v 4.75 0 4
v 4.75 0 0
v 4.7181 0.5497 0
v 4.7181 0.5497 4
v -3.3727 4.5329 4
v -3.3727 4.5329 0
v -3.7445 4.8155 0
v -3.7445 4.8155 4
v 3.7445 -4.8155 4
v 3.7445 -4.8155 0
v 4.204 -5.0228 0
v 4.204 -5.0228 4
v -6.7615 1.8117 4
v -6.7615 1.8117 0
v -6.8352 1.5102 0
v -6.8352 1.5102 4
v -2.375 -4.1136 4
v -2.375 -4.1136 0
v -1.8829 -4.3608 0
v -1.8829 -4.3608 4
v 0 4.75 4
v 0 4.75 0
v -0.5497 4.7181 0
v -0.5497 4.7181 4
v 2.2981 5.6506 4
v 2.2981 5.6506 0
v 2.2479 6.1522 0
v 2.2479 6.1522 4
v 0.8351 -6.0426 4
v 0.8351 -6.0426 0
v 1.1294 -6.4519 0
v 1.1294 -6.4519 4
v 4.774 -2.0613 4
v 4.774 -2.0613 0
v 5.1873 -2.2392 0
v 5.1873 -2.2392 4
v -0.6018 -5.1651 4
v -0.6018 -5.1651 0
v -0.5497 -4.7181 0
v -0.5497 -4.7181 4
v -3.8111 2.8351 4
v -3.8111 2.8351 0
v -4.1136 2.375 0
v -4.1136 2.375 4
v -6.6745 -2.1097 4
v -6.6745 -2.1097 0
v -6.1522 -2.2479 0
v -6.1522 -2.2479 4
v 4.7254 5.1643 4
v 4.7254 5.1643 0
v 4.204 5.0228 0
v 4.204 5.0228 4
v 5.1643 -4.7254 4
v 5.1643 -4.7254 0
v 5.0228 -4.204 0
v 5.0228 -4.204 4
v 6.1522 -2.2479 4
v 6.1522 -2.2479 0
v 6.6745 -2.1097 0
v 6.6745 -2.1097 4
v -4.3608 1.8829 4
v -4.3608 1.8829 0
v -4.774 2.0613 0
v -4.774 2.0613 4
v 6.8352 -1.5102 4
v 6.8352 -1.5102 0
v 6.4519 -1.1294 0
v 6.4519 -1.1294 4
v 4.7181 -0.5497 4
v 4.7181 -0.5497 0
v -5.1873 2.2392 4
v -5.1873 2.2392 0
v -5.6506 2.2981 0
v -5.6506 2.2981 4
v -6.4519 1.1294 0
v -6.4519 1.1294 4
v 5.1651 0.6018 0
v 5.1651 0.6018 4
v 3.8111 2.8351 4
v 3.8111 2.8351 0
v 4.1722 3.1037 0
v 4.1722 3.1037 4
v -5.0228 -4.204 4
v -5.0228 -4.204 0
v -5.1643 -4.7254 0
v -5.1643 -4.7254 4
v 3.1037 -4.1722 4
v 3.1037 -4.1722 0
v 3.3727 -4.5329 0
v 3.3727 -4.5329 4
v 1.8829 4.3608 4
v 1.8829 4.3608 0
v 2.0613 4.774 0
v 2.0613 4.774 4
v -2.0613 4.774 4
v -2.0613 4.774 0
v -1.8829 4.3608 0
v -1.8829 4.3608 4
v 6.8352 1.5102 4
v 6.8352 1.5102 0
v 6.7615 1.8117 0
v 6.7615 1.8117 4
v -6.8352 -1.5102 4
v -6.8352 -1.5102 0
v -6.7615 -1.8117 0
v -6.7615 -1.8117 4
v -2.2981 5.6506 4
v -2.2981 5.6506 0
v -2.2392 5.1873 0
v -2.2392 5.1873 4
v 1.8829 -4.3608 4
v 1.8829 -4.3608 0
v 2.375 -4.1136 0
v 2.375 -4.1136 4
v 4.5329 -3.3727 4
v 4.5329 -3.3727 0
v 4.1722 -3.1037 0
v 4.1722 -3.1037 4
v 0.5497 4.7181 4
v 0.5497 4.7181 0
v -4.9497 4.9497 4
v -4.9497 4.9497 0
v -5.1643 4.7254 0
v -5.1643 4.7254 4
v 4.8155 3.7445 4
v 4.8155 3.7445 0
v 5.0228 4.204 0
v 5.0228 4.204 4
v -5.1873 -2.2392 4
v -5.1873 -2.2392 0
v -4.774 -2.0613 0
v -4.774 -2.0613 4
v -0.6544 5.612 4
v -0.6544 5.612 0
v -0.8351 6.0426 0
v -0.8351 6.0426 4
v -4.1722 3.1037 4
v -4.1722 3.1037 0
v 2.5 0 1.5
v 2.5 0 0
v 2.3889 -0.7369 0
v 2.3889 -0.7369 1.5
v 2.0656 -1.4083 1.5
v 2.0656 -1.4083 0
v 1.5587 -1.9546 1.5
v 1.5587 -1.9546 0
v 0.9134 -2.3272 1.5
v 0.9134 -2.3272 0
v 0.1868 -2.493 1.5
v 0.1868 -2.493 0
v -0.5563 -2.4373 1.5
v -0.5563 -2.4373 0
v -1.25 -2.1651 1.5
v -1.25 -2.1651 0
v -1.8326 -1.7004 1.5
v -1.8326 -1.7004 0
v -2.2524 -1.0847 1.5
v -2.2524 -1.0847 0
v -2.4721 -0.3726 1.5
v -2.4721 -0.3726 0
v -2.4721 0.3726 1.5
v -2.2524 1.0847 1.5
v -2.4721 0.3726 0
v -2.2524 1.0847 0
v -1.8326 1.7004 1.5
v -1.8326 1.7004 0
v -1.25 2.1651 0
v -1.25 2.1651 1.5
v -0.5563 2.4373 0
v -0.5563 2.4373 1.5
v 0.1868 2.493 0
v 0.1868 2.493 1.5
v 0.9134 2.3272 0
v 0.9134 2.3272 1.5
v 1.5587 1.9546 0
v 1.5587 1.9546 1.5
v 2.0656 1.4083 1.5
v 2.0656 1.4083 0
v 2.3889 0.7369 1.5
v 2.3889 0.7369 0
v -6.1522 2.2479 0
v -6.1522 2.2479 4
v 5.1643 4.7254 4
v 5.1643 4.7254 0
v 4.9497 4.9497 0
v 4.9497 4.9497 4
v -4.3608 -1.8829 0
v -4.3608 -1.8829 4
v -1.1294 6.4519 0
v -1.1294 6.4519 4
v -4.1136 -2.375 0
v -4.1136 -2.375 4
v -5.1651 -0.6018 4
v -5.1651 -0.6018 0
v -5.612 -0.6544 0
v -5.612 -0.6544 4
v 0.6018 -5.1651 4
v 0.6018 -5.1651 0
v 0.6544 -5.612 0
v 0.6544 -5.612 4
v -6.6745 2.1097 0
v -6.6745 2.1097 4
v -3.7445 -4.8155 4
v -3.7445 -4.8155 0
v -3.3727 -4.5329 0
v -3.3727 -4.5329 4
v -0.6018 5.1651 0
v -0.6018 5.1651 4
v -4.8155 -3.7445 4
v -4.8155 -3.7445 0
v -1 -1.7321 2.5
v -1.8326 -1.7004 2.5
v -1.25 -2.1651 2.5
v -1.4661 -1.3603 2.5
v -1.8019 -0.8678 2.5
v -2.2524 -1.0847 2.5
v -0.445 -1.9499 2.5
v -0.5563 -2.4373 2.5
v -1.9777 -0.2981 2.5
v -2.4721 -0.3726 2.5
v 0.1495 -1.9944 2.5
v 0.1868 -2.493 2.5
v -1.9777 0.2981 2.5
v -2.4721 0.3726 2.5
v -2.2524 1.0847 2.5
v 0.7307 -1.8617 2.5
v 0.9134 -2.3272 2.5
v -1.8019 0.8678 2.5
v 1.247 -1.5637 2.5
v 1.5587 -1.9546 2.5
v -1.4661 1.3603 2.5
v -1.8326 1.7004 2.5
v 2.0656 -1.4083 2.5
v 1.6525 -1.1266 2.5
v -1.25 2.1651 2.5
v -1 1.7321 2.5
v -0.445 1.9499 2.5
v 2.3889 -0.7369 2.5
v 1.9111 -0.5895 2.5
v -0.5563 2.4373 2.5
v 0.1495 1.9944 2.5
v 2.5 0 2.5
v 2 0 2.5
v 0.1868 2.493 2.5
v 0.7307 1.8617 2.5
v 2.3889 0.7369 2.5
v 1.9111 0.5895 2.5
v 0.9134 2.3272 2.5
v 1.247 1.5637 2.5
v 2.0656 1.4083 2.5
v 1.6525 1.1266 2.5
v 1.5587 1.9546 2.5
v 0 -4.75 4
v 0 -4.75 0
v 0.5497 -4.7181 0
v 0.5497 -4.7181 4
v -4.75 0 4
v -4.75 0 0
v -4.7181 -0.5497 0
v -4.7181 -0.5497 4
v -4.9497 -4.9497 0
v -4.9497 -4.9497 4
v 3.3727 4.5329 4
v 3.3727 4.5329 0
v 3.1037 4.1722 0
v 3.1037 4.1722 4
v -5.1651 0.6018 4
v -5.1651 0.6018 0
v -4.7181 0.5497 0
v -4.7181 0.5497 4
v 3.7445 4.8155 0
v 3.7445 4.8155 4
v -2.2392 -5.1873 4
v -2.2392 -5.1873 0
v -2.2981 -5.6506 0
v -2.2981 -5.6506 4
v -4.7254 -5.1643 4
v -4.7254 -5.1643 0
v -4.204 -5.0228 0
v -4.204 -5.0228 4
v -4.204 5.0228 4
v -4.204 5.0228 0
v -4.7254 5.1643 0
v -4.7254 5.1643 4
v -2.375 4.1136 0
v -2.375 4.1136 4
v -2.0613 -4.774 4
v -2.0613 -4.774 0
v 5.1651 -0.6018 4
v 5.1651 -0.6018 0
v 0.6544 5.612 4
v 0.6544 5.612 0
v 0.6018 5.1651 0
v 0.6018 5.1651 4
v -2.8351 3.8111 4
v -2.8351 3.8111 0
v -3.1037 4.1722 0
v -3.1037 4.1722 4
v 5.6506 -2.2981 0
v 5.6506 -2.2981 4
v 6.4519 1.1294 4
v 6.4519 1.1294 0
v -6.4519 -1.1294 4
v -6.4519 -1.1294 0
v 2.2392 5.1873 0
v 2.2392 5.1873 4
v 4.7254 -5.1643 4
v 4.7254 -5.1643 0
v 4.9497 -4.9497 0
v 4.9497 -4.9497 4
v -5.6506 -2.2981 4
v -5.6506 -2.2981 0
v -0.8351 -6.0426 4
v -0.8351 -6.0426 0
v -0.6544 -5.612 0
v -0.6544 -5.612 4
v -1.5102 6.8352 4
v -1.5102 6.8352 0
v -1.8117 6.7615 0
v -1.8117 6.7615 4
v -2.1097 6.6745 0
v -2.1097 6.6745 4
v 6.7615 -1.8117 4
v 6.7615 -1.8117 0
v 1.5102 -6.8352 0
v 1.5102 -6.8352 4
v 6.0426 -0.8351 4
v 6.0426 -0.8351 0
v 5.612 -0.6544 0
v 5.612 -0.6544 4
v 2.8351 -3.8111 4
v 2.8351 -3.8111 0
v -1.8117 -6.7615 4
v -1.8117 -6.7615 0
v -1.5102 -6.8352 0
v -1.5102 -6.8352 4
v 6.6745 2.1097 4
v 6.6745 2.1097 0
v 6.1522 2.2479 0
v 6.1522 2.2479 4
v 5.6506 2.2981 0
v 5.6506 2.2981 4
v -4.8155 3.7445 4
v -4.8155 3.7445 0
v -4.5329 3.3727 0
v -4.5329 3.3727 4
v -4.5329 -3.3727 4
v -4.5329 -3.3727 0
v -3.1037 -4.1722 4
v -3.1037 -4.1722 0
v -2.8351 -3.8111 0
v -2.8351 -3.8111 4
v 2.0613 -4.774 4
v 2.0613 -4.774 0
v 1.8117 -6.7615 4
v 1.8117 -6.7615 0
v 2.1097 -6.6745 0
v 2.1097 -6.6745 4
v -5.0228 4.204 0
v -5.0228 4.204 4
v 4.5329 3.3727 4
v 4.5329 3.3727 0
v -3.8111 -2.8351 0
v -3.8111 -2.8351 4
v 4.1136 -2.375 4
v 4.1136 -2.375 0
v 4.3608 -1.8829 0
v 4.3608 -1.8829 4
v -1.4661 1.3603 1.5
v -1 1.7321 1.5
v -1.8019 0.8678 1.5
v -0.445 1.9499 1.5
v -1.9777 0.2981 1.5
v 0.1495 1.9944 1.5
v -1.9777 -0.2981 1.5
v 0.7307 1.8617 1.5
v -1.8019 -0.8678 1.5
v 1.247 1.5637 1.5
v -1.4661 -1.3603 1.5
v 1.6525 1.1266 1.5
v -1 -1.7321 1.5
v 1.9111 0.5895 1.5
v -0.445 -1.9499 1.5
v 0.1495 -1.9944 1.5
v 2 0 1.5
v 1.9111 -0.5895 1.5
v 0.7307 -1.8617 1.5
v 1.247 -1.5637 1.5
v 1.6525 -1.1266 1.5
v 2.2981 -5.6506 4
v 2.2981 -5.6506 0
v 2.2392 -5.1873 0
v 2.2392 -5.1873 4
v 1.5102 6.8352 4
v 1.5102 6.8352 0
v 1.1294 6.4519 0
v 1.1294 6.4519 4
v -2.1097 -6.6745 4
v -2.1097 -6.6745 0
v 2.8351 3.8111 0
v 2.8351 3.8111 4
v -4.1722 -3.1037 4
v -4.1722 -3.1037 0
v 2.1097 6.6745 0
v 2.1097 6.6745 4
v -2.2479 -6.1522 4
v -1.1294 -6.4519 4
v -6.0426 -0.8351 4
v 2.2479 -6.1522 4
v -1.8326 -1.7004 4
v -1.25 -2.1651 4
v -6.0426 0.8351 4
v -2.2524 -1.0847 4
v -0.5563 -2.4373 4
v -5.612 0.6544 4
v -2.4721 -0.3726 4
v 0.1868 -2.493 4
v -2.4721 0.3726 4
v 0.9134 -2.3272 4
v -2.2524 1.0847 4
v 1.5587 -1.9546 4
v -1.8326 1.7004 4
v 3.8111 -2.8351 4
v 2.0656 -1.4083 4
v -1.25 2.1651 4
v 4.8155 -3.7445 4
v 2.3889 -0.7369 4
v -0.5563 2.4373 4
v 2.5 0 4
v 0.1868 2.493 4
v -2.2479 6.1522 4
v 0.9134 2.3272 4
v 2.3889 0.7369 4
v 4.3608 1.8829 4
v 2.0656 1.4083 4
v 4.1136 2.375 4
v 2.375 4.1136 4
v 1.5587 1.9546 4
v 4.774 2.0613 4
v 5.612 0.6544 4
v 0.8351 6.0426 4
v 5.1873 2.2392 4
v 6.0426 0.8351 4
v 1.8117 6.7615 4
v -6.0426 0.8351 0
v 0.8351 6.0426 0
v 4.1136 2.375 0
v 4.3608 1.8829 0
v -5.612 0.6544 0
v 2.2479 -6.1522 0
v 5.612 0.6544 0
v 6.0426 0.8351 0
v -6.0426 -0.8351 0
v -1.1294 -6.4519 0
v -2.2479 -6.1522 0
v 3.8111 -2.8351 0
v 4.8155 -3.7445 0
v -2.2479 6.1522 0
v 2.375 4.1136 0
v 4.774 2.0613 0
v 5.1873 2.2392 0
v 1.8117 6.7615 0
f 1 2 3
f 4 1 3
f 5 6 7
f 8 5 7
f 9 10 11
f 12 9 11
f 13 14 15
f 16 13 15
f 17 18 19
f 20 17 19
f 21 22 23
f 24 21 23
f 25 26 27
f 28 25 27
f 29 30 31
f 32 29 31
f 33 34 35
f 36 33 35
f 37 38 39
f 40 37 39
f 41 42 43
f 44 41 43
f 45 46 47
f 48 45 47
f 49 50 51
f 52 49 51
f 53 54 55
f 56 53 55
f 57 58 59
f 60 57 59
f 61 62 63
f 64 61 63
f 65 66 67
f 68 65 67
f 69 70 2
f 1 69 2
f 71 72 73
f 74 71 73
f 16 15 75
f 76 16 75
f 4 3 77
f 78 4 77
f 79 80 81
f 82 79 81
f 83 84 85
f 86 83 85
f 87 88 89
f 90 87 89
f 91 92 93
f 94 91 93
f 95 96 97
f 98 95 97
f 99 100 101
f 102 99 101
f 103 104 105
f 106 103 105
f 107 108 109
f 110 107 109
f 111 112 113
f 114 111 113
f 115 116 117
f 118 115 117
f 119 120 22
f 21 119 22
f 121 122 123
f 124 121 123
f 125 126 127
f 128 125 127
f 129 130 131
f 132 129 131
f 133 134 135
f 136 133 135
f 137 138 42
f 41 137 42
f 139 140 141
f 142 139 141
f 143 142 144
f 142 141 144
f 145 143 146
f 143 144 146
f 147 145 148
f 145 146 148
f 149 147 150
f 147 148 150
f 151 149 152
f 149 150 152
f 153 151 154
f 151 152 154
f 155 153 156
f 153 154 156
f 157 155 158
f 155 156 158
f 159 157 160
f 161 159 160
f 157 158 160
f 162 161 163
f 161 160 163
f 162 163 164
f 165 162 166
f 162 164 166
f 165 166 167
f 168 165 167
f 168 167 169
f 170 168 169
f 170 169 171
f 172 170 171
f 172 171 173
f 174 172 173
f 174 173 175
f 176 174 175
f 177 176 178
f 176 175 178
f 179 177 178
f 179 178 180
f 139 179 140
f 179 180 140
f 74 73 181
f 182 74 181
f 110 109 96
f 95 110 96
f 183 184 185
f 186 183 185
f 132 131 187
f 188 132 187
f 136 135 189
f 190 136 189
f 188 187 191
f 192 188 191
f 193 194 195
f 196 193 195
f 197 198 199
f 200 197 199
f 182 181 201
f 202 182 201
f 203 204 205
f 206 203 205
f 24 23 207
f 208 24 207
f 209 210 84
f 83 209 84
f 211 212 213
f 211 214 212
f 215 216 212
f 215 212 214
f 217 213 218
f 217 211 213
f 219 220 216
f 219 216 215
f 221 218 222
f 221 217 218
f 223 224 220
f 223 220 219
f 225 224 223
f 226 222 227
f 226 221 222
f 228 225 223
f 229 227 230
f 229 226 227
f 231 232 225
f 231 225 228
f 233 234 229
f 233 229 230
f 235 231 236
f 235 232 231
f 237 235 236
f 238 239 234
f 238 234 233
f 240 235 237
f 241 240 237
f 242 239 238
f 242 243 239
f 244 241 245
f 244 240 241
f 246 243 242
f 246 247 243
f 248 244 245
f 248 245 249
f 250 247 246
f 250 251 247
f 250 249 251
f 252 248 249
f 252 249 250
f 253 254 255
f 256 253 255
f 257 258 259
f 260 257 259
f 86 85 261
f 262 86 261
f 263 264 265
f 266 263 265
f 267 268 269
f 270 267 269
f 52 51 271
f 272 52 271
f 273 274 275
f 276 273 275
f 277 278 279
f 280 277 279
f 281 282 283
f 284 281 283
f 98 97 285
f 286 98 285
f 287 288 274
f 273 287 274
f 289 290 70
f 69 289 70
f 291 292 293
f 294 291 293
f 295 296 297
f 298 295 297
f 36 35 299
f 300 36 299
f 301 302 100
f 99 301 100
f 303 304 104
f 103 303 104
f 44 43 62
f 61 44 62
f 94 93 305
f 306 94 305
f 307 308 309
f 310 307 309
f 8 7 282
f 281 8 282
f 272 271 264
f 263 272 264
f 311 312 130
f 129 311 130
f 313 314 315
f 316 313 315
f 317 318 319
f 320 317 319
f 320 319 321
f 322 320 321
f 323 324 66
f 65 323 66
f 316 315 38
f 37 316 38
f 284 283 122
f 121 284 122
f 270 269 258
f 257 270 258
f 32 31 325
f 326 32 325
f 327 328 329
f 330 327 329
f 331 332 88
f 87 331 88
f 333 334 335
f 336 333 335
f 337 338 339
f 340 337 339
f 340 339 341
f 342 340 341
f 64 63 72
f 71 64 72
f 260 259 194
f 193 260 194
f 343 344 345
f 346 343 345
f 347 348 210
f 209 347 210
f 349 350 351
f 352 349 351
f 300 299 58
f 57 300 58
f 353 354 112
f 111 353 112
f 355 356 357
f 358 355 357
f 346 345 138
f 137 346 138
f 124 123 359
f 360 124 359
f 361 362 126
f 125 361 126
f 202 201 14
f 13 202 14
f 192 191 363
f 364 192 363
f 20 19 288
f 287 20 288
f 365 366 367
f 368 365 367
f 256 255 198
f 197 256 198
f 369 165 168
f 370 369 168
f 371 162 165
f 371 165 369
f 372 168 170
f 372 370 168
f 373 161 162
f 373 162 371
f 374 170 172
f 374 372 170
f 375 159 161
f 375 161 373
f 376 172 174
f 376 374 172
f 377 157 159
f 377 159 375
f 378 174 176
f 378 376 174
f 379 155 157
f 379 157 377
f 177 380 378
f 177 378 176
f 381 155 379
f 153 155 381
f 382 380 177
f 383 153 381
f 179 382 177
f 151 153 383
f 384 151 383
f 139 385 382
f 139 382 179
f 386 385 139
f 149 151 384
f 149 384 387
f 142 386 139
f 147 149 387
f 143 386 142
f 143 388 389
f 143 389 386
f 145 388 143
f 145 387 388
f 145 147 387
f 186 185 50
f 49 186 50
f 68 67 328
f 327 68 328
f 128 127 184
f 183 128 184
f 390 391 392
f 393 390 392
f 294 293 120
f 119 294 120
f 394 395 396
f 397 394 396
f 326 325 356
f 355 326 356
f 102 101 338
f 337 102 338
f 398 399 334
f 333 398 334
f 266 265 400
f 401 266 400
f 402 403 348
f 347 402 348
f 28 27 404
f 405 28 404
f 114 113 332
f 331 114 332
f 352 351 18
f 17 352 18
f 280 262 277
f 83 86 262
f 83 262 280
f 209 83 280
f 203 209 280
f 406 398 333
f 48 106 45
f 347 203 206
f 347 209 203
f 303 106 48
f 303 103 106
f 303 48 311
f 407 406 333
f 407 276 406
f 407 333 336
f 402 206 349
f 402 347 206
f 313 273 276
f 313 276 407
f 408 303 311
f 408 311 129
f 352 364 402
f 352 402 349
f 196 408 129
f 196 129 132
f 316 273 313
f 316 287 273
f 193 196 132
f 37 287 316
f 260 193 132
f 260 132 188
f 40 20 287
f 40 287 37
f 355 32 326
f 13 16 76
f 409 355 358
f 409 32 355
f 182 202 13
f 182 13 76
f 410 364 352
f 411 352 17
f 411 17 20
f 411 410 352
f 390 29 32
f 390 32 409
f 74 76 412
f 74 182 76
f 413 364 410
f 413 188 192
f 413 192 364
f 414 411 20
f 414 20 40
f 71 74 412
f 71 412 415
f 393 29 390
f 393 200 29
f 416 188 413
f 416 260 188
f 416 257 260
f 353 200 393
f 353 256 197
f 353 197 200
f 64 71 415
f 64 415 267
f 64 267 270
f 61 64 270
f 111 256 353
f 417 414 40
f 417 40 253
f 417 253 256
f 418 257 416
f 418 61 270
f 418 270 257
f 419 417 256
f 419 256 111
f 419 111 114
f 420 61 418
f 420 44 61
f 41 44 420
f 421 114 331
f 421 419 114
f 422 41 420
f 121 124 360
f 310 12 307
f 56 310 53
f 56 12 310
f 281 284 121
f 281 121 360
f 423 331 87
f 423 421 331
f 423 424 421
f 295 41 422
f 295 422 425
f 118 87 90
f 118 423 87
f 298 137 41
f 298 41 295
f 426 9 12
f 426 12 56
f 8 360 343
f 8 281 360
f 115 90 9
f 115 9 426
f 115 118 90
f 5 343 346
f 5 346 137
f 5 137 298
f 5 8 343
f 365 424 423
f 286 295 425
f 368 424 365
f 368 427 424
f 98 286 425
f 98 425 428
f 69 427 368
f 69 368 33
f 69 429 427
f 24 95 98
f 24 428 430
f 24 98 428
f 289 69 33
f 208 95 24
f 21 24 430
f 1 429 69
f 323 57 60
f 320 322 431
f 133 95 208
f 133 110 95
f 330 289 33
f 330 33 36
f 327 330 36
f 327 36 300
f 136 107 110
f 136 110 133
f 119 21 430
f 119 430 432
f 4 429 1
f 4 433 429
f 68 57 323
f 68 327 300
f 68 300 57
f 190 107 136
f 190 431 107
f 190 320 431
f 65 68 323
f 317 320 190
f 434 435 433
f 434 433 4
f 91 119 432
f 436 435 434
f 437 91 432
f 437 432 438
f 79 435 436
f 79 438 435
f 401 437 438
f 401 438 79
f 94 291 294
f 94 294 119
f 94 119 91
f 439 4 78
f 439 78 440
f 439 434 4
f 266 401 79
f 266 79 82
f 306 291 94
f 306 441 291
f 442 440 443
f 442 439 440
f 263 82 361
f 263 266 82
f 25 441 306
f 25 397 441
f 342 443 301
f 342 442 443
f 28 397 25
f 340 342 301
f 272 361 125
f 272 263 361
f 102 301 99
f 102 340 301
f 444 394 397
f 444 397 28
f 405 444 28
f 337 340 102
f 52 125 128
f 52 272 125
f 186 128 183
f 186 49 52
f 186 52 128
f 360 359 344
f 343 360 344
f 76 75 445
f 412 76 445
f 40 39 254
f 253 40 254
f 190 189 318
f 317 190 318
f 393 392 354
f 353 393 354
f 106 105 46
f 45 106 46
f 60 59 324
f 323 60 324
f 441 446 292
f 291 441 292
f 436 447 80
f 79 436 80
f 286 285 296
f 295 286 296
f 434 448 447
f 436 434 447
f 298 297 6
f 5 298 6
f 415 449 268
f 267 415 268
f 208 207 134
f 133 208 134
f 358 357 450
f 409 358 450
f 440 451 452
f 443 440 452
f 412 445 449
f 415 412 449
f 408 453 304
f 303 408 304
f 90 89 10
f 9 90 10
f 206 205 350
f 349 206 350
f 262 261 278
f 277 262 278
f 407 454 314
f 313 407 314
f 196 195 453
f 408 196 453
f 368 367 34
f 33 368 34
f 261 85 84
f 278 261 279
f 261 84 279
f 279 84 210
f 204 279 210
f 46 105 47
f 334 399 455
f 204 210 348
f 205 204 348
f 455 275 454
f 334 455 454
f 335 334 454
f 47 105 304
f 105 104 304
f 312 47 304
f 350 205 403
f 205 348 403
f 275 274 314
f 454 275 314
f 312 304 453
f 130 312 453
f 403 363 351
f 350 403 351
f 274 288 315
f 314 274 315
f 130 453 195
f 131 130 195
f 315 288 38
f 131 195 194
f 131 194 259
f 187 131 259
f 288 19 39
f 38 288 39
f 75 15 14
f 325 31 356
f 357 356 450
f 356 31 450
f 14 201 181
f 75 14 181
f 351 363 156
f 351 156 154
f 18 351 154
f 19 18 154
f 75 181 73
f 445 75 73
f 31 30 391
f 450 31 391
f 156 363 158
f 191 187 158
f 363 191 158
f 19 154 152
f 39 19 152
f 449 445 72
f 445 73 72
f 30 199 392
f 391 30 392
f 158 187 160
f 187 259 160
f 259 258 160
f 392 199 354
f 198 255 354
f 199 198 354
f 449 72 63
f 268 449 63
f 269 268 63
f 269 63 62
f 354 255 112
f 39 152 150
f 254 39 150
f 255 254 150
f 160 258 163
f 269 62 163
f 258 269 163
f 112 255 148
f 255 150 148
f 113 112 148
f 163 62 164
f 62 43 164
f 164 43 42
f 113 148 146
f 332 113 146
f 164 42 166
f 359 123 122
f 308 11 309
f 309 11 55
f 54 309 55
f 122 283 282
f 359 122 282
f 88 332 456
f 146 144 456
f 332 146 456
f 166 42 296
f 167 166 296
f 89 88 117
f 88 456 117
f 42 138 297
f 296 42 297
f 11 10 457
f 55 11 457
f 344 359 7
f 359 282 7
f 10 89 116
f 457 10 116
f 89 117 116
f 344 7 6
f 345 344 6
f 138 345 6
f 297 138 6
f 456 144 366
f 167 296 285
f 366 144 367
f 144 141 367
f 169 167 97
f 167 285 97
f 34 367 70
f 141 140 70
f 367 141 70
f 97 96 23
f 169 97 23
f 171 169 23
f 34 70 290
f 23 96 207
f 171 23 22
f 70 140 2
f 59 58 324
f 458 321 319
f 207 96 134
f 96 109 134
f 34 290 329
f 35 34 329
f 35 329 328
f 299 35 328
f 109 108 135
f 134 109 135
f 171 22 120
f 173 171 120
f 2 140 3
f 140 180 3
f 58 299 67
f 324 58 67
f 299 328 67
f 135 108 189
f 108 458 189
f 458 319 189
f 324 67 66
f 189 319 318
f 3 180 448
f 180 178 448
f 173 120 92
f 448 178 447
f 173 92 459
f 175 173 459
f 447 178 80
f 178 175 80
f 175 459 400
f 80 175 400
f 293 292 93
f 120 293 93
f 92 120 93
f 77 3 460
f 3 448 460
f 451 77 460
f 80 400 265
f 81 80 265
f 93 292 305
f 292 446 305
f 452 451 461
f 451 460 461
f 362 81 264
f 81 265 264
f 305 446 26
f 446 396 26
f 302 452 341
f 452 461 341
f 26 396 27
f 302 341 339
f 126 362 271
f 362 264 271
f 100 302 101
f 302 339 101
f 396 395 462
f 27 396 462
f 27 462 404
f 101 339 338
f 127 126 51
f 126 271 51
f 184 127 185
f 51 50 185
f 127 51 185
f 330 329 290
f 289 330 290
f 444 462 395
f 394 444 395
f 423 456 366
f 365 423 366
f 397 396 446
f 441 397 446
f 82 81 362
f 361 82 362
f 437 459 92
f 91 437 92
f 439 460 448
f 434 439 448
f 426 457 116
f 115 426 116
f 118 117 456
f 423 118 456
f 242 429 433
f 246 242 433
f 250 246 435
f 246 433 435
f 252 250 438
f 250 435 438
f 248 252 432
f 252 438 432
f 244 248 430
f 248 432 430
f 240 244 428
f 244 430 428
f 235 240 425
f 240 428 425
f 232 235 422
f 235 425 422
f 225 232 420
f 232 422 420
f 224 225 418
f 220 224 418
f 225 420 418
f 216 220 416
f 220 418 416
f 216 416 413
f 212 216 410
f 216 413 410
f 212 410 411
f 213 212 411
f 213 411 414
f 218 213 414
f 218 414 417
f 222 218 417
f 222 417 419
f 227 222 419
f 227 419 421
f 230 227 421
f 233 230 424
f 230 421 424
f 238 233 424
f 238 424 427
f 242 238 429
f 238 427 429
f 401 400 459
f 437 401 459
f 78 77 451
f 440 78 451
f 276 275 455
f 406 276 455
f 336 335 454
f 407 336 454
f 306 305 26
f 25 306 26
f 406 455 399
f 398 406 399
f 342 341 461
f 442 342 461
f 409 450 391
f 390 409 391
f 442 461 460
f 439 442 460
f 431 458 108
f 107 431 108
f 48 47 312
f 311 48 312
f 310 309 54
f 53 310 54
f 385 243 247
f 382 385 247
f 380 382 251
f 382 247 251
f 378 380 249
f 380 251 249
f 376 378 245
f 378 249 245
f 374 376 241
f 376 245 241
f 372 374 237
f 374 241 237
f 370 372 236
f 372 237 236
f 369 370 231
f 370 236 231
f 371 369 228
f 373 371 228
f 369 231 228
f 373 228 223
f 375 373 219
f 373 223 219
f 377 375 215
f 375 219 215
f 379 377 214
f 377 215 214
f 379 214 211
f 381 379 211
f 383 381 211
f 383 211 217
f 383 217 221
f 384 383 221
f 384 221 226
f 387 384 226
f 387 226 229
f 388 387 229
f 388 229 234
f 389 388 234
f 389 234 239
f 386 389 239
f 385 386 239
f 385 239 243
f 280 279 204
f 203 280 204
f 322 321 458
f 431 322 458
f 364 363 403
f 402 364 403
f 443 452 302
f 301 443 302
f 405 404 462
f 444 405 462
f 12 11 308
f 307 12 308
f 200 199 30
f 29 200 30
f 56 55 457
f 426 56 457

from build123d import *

# Parameters (mm, degrees)
F1_DEPTH = 4
F2_R     = 2.5
F3_DEPTH = 1.5
F4_R     = 2.5
F5_DEPTH = 1.5
F6_R     = 2
F7_DEPTH = 25


with BuildPart() as f1:
    # F0 (on Top) → F1 (new body)
    with BuildSketch(Plane.XY):
        Polygon((4.71808, -0.549743), (4.75, 0), (4.71808, 0.549743), (5.165056, 0.601824), (5.611973, 0.654414), (6.042571, 0.835065), (6.451897, 1.12939), (6.835156, 1.510179), (6.761481, 1.811733), (6.674508, 2.109724), (6.152202, 2.247869), (5.650552, 2.298099), (5.187318, 2.239248), (4.773982, 2.061333), (4.360849, 1.882949), (4.113621, 2.375), (3.811106, 2.835132), (4.172158, 3.103723), (4.532904, 3.372726), (4.815488, 3.744473), (5.022812, 4.204029), (5.164329, 4.725432), (4.949747, 4.949747), (4.725432, 5.164329), (4.204029, 5.022812), (3.744473, 4.815488), (3.372726, 4.532904), (3.103723, 4.172158), (2.835132, 3.811106), (2.375, 4.113621), (1.882949, 4.360849), (2.061333, 4.773982), (2.239248, 5.187318), (2.298099, 5.650552), (2.247869, 6.152202), (2.109724, 6.674508), (1.811733, 6.761481), (1.510179, 6.835156), (1.12939, 6.451897), (0.835065, 6.042571), (0.654414, 5.611973), (0.601824, 5.165056), (0.549743, 4.71808), (0, 4.75), (-0.549743, 4.71808), (-0.601824, 5.165056), (-0.654414, 5.611973), (-0.835065, 6.042571), (-1.12939, 6.451897), (-1.510179, 6.835156), (-1.811733, 6.761481), (-2.109724, 6.674508), (-2.247869, 6.152202), (-2.298099, 5.650552), (-2.239248, 5.187318), (-2.061333, 4.773982), (-1.882949, 4.360849), (-2.375, 4.113621), (-2.835132, 3.811106), (-3.103723, 4.172158), (-3.372726, 4.532904), (-3.744473, 4.815488), (-4.204029, 5.022812), (-4.725432, 5.164329), (-4.949747, 4.949747), (-5.164329, 4.725432), (-5.022812, 4.204029), (-4.815488, 3.744473), (-4.532904, 3.372726), (-4.172158, 3.103723), (-3.811106, 2.835132), (-4.113621, 2.375), (-4.360849, 1.882949), (-4.773982, 2.061333), (-5.187318, 2.239248), (-5.650552, 2.298099), (-6.152202, 2.247869), (-6.674508, 2.109724), (-6.761481, 1.811733), (-6.835156, 1.510179), (-6.451897, 1.12939), (-6.042571, 0.835065), (-5.611973, 0.654414), (-5.165056, 0.601824), (-4.71808, 0.549743), (-4.75, 0), (-4.71808, -0.549743), (-5.165056, -0.601824), (-5.611973, -0.654414), (-6.042571, -0.835065), (-6.451897, -1.12939), (-6.835156, -1.510179), (-6.761481, -1.811733), (-6.674508, -2.109724), (-6.152202, -2.247869), (-5.650552, -2.298099), (-5.187318, -2.239248), (-4.773982, -2.061333), (-4.360849, -1.882949), (-4.113621, -2.375), (-3.811106, -2.835132), (-4.172158, -3.103723), (-4.532904, -3.372726), (-4.815488, -3.744473), (-5.022812, -4.204029), (-5.164329, -4.725432), (-4.949747, -4.949747), (-4.725432, -5.164329), (-4.204029, -5.022812), (-3.744473, -4.815488), (-3.372726, -4.532904), (-3.103723, -4.172158), (-2.835132, -3.811106), (-2.375, -4.113621), (-1.882949, -4.360849), (-2.061333, -4.773982), (-2.239248, -5.187318), (-2.298099, -5.650552), (-2.247869, -6.152202), (-2.109724, -6.674508), (-1.811733, -6.761481), (-1.510179, -6.835156), (-1.12939, -6.451897), (-0.835065, -6.042571), (-0.654414, -5.611973), (-0.601824, -5.165056), (-0.549743, -4.71808), (0, -4.75), (0.549743, -4.71808), (0.601824, -5.165056), (0.654414, -5.611973), (0.835065, -6.042571), (1.12939, -6.451897), (1.510179, -6.835156), (1.811733, -6.761481), (2.109724, -6.674508), (2.247869, -6.152202), (2.298099, -5.650552), (2.239248, -5.187318), (2.061333, -4.773982), (1.882949, -4.360849), (2.375, -4.113621), (2.835132, -3.811106), (3.103723, -4.172158), (3.372726, -4.532904), (3.744473, -4.815488), (4.204029, -5.022812), (4.725432, -5.164329), (4.949747, -4.949747), (5.164329, -4.725432), (5.022812, -4.204029), (4.815488, -3.744473), (4.532904, -3.372726), (4.172158, -3.103723), (3.811106, -2.835132), (4.113621, -2.375), (4.360849, -1.882949), (4.773982, -2.061333), (5.187318, -2.239248), (5.650552, -2.298099), (6.152202, -2.247869), (6.674508, -2.109724), (6.761481, -1.811733), (6.835156, -1.510179), (6.451897, -1.12939), (6.042571, -0.835065), (5.611973, -0.654414), (5.165056, -0.601824), align=None)
    extrude(amount=F1_DEPTH)

    # F2 (on face) → F3 (cut)
    with BuildSketch(Plane(origin=(0, 0, 0), x_dir=(1, 0, 0), z_dir=(0, 0, -1))):
        Circle(F2_R)
    extrude(amount=-F3_DEPTH, mode=Mode.SUBTRACT)

    # F4 (on face) → F5 (cut)
    with BuildSketch(Plane.XY.offset(4)):
        Circle(F4_R)
    extrude(amount=-F5_DEPTH, mode=Mode.SUBTRACT)

    # F6 (on face) → F7 (cut)
    with BuildSketch(Plane.XY.offset(2.5)):
        Circle(F6_R)
    extrude(amount=-F7_DEPTH, mode=Mode.SUBTRACT)


solid = f1.part
